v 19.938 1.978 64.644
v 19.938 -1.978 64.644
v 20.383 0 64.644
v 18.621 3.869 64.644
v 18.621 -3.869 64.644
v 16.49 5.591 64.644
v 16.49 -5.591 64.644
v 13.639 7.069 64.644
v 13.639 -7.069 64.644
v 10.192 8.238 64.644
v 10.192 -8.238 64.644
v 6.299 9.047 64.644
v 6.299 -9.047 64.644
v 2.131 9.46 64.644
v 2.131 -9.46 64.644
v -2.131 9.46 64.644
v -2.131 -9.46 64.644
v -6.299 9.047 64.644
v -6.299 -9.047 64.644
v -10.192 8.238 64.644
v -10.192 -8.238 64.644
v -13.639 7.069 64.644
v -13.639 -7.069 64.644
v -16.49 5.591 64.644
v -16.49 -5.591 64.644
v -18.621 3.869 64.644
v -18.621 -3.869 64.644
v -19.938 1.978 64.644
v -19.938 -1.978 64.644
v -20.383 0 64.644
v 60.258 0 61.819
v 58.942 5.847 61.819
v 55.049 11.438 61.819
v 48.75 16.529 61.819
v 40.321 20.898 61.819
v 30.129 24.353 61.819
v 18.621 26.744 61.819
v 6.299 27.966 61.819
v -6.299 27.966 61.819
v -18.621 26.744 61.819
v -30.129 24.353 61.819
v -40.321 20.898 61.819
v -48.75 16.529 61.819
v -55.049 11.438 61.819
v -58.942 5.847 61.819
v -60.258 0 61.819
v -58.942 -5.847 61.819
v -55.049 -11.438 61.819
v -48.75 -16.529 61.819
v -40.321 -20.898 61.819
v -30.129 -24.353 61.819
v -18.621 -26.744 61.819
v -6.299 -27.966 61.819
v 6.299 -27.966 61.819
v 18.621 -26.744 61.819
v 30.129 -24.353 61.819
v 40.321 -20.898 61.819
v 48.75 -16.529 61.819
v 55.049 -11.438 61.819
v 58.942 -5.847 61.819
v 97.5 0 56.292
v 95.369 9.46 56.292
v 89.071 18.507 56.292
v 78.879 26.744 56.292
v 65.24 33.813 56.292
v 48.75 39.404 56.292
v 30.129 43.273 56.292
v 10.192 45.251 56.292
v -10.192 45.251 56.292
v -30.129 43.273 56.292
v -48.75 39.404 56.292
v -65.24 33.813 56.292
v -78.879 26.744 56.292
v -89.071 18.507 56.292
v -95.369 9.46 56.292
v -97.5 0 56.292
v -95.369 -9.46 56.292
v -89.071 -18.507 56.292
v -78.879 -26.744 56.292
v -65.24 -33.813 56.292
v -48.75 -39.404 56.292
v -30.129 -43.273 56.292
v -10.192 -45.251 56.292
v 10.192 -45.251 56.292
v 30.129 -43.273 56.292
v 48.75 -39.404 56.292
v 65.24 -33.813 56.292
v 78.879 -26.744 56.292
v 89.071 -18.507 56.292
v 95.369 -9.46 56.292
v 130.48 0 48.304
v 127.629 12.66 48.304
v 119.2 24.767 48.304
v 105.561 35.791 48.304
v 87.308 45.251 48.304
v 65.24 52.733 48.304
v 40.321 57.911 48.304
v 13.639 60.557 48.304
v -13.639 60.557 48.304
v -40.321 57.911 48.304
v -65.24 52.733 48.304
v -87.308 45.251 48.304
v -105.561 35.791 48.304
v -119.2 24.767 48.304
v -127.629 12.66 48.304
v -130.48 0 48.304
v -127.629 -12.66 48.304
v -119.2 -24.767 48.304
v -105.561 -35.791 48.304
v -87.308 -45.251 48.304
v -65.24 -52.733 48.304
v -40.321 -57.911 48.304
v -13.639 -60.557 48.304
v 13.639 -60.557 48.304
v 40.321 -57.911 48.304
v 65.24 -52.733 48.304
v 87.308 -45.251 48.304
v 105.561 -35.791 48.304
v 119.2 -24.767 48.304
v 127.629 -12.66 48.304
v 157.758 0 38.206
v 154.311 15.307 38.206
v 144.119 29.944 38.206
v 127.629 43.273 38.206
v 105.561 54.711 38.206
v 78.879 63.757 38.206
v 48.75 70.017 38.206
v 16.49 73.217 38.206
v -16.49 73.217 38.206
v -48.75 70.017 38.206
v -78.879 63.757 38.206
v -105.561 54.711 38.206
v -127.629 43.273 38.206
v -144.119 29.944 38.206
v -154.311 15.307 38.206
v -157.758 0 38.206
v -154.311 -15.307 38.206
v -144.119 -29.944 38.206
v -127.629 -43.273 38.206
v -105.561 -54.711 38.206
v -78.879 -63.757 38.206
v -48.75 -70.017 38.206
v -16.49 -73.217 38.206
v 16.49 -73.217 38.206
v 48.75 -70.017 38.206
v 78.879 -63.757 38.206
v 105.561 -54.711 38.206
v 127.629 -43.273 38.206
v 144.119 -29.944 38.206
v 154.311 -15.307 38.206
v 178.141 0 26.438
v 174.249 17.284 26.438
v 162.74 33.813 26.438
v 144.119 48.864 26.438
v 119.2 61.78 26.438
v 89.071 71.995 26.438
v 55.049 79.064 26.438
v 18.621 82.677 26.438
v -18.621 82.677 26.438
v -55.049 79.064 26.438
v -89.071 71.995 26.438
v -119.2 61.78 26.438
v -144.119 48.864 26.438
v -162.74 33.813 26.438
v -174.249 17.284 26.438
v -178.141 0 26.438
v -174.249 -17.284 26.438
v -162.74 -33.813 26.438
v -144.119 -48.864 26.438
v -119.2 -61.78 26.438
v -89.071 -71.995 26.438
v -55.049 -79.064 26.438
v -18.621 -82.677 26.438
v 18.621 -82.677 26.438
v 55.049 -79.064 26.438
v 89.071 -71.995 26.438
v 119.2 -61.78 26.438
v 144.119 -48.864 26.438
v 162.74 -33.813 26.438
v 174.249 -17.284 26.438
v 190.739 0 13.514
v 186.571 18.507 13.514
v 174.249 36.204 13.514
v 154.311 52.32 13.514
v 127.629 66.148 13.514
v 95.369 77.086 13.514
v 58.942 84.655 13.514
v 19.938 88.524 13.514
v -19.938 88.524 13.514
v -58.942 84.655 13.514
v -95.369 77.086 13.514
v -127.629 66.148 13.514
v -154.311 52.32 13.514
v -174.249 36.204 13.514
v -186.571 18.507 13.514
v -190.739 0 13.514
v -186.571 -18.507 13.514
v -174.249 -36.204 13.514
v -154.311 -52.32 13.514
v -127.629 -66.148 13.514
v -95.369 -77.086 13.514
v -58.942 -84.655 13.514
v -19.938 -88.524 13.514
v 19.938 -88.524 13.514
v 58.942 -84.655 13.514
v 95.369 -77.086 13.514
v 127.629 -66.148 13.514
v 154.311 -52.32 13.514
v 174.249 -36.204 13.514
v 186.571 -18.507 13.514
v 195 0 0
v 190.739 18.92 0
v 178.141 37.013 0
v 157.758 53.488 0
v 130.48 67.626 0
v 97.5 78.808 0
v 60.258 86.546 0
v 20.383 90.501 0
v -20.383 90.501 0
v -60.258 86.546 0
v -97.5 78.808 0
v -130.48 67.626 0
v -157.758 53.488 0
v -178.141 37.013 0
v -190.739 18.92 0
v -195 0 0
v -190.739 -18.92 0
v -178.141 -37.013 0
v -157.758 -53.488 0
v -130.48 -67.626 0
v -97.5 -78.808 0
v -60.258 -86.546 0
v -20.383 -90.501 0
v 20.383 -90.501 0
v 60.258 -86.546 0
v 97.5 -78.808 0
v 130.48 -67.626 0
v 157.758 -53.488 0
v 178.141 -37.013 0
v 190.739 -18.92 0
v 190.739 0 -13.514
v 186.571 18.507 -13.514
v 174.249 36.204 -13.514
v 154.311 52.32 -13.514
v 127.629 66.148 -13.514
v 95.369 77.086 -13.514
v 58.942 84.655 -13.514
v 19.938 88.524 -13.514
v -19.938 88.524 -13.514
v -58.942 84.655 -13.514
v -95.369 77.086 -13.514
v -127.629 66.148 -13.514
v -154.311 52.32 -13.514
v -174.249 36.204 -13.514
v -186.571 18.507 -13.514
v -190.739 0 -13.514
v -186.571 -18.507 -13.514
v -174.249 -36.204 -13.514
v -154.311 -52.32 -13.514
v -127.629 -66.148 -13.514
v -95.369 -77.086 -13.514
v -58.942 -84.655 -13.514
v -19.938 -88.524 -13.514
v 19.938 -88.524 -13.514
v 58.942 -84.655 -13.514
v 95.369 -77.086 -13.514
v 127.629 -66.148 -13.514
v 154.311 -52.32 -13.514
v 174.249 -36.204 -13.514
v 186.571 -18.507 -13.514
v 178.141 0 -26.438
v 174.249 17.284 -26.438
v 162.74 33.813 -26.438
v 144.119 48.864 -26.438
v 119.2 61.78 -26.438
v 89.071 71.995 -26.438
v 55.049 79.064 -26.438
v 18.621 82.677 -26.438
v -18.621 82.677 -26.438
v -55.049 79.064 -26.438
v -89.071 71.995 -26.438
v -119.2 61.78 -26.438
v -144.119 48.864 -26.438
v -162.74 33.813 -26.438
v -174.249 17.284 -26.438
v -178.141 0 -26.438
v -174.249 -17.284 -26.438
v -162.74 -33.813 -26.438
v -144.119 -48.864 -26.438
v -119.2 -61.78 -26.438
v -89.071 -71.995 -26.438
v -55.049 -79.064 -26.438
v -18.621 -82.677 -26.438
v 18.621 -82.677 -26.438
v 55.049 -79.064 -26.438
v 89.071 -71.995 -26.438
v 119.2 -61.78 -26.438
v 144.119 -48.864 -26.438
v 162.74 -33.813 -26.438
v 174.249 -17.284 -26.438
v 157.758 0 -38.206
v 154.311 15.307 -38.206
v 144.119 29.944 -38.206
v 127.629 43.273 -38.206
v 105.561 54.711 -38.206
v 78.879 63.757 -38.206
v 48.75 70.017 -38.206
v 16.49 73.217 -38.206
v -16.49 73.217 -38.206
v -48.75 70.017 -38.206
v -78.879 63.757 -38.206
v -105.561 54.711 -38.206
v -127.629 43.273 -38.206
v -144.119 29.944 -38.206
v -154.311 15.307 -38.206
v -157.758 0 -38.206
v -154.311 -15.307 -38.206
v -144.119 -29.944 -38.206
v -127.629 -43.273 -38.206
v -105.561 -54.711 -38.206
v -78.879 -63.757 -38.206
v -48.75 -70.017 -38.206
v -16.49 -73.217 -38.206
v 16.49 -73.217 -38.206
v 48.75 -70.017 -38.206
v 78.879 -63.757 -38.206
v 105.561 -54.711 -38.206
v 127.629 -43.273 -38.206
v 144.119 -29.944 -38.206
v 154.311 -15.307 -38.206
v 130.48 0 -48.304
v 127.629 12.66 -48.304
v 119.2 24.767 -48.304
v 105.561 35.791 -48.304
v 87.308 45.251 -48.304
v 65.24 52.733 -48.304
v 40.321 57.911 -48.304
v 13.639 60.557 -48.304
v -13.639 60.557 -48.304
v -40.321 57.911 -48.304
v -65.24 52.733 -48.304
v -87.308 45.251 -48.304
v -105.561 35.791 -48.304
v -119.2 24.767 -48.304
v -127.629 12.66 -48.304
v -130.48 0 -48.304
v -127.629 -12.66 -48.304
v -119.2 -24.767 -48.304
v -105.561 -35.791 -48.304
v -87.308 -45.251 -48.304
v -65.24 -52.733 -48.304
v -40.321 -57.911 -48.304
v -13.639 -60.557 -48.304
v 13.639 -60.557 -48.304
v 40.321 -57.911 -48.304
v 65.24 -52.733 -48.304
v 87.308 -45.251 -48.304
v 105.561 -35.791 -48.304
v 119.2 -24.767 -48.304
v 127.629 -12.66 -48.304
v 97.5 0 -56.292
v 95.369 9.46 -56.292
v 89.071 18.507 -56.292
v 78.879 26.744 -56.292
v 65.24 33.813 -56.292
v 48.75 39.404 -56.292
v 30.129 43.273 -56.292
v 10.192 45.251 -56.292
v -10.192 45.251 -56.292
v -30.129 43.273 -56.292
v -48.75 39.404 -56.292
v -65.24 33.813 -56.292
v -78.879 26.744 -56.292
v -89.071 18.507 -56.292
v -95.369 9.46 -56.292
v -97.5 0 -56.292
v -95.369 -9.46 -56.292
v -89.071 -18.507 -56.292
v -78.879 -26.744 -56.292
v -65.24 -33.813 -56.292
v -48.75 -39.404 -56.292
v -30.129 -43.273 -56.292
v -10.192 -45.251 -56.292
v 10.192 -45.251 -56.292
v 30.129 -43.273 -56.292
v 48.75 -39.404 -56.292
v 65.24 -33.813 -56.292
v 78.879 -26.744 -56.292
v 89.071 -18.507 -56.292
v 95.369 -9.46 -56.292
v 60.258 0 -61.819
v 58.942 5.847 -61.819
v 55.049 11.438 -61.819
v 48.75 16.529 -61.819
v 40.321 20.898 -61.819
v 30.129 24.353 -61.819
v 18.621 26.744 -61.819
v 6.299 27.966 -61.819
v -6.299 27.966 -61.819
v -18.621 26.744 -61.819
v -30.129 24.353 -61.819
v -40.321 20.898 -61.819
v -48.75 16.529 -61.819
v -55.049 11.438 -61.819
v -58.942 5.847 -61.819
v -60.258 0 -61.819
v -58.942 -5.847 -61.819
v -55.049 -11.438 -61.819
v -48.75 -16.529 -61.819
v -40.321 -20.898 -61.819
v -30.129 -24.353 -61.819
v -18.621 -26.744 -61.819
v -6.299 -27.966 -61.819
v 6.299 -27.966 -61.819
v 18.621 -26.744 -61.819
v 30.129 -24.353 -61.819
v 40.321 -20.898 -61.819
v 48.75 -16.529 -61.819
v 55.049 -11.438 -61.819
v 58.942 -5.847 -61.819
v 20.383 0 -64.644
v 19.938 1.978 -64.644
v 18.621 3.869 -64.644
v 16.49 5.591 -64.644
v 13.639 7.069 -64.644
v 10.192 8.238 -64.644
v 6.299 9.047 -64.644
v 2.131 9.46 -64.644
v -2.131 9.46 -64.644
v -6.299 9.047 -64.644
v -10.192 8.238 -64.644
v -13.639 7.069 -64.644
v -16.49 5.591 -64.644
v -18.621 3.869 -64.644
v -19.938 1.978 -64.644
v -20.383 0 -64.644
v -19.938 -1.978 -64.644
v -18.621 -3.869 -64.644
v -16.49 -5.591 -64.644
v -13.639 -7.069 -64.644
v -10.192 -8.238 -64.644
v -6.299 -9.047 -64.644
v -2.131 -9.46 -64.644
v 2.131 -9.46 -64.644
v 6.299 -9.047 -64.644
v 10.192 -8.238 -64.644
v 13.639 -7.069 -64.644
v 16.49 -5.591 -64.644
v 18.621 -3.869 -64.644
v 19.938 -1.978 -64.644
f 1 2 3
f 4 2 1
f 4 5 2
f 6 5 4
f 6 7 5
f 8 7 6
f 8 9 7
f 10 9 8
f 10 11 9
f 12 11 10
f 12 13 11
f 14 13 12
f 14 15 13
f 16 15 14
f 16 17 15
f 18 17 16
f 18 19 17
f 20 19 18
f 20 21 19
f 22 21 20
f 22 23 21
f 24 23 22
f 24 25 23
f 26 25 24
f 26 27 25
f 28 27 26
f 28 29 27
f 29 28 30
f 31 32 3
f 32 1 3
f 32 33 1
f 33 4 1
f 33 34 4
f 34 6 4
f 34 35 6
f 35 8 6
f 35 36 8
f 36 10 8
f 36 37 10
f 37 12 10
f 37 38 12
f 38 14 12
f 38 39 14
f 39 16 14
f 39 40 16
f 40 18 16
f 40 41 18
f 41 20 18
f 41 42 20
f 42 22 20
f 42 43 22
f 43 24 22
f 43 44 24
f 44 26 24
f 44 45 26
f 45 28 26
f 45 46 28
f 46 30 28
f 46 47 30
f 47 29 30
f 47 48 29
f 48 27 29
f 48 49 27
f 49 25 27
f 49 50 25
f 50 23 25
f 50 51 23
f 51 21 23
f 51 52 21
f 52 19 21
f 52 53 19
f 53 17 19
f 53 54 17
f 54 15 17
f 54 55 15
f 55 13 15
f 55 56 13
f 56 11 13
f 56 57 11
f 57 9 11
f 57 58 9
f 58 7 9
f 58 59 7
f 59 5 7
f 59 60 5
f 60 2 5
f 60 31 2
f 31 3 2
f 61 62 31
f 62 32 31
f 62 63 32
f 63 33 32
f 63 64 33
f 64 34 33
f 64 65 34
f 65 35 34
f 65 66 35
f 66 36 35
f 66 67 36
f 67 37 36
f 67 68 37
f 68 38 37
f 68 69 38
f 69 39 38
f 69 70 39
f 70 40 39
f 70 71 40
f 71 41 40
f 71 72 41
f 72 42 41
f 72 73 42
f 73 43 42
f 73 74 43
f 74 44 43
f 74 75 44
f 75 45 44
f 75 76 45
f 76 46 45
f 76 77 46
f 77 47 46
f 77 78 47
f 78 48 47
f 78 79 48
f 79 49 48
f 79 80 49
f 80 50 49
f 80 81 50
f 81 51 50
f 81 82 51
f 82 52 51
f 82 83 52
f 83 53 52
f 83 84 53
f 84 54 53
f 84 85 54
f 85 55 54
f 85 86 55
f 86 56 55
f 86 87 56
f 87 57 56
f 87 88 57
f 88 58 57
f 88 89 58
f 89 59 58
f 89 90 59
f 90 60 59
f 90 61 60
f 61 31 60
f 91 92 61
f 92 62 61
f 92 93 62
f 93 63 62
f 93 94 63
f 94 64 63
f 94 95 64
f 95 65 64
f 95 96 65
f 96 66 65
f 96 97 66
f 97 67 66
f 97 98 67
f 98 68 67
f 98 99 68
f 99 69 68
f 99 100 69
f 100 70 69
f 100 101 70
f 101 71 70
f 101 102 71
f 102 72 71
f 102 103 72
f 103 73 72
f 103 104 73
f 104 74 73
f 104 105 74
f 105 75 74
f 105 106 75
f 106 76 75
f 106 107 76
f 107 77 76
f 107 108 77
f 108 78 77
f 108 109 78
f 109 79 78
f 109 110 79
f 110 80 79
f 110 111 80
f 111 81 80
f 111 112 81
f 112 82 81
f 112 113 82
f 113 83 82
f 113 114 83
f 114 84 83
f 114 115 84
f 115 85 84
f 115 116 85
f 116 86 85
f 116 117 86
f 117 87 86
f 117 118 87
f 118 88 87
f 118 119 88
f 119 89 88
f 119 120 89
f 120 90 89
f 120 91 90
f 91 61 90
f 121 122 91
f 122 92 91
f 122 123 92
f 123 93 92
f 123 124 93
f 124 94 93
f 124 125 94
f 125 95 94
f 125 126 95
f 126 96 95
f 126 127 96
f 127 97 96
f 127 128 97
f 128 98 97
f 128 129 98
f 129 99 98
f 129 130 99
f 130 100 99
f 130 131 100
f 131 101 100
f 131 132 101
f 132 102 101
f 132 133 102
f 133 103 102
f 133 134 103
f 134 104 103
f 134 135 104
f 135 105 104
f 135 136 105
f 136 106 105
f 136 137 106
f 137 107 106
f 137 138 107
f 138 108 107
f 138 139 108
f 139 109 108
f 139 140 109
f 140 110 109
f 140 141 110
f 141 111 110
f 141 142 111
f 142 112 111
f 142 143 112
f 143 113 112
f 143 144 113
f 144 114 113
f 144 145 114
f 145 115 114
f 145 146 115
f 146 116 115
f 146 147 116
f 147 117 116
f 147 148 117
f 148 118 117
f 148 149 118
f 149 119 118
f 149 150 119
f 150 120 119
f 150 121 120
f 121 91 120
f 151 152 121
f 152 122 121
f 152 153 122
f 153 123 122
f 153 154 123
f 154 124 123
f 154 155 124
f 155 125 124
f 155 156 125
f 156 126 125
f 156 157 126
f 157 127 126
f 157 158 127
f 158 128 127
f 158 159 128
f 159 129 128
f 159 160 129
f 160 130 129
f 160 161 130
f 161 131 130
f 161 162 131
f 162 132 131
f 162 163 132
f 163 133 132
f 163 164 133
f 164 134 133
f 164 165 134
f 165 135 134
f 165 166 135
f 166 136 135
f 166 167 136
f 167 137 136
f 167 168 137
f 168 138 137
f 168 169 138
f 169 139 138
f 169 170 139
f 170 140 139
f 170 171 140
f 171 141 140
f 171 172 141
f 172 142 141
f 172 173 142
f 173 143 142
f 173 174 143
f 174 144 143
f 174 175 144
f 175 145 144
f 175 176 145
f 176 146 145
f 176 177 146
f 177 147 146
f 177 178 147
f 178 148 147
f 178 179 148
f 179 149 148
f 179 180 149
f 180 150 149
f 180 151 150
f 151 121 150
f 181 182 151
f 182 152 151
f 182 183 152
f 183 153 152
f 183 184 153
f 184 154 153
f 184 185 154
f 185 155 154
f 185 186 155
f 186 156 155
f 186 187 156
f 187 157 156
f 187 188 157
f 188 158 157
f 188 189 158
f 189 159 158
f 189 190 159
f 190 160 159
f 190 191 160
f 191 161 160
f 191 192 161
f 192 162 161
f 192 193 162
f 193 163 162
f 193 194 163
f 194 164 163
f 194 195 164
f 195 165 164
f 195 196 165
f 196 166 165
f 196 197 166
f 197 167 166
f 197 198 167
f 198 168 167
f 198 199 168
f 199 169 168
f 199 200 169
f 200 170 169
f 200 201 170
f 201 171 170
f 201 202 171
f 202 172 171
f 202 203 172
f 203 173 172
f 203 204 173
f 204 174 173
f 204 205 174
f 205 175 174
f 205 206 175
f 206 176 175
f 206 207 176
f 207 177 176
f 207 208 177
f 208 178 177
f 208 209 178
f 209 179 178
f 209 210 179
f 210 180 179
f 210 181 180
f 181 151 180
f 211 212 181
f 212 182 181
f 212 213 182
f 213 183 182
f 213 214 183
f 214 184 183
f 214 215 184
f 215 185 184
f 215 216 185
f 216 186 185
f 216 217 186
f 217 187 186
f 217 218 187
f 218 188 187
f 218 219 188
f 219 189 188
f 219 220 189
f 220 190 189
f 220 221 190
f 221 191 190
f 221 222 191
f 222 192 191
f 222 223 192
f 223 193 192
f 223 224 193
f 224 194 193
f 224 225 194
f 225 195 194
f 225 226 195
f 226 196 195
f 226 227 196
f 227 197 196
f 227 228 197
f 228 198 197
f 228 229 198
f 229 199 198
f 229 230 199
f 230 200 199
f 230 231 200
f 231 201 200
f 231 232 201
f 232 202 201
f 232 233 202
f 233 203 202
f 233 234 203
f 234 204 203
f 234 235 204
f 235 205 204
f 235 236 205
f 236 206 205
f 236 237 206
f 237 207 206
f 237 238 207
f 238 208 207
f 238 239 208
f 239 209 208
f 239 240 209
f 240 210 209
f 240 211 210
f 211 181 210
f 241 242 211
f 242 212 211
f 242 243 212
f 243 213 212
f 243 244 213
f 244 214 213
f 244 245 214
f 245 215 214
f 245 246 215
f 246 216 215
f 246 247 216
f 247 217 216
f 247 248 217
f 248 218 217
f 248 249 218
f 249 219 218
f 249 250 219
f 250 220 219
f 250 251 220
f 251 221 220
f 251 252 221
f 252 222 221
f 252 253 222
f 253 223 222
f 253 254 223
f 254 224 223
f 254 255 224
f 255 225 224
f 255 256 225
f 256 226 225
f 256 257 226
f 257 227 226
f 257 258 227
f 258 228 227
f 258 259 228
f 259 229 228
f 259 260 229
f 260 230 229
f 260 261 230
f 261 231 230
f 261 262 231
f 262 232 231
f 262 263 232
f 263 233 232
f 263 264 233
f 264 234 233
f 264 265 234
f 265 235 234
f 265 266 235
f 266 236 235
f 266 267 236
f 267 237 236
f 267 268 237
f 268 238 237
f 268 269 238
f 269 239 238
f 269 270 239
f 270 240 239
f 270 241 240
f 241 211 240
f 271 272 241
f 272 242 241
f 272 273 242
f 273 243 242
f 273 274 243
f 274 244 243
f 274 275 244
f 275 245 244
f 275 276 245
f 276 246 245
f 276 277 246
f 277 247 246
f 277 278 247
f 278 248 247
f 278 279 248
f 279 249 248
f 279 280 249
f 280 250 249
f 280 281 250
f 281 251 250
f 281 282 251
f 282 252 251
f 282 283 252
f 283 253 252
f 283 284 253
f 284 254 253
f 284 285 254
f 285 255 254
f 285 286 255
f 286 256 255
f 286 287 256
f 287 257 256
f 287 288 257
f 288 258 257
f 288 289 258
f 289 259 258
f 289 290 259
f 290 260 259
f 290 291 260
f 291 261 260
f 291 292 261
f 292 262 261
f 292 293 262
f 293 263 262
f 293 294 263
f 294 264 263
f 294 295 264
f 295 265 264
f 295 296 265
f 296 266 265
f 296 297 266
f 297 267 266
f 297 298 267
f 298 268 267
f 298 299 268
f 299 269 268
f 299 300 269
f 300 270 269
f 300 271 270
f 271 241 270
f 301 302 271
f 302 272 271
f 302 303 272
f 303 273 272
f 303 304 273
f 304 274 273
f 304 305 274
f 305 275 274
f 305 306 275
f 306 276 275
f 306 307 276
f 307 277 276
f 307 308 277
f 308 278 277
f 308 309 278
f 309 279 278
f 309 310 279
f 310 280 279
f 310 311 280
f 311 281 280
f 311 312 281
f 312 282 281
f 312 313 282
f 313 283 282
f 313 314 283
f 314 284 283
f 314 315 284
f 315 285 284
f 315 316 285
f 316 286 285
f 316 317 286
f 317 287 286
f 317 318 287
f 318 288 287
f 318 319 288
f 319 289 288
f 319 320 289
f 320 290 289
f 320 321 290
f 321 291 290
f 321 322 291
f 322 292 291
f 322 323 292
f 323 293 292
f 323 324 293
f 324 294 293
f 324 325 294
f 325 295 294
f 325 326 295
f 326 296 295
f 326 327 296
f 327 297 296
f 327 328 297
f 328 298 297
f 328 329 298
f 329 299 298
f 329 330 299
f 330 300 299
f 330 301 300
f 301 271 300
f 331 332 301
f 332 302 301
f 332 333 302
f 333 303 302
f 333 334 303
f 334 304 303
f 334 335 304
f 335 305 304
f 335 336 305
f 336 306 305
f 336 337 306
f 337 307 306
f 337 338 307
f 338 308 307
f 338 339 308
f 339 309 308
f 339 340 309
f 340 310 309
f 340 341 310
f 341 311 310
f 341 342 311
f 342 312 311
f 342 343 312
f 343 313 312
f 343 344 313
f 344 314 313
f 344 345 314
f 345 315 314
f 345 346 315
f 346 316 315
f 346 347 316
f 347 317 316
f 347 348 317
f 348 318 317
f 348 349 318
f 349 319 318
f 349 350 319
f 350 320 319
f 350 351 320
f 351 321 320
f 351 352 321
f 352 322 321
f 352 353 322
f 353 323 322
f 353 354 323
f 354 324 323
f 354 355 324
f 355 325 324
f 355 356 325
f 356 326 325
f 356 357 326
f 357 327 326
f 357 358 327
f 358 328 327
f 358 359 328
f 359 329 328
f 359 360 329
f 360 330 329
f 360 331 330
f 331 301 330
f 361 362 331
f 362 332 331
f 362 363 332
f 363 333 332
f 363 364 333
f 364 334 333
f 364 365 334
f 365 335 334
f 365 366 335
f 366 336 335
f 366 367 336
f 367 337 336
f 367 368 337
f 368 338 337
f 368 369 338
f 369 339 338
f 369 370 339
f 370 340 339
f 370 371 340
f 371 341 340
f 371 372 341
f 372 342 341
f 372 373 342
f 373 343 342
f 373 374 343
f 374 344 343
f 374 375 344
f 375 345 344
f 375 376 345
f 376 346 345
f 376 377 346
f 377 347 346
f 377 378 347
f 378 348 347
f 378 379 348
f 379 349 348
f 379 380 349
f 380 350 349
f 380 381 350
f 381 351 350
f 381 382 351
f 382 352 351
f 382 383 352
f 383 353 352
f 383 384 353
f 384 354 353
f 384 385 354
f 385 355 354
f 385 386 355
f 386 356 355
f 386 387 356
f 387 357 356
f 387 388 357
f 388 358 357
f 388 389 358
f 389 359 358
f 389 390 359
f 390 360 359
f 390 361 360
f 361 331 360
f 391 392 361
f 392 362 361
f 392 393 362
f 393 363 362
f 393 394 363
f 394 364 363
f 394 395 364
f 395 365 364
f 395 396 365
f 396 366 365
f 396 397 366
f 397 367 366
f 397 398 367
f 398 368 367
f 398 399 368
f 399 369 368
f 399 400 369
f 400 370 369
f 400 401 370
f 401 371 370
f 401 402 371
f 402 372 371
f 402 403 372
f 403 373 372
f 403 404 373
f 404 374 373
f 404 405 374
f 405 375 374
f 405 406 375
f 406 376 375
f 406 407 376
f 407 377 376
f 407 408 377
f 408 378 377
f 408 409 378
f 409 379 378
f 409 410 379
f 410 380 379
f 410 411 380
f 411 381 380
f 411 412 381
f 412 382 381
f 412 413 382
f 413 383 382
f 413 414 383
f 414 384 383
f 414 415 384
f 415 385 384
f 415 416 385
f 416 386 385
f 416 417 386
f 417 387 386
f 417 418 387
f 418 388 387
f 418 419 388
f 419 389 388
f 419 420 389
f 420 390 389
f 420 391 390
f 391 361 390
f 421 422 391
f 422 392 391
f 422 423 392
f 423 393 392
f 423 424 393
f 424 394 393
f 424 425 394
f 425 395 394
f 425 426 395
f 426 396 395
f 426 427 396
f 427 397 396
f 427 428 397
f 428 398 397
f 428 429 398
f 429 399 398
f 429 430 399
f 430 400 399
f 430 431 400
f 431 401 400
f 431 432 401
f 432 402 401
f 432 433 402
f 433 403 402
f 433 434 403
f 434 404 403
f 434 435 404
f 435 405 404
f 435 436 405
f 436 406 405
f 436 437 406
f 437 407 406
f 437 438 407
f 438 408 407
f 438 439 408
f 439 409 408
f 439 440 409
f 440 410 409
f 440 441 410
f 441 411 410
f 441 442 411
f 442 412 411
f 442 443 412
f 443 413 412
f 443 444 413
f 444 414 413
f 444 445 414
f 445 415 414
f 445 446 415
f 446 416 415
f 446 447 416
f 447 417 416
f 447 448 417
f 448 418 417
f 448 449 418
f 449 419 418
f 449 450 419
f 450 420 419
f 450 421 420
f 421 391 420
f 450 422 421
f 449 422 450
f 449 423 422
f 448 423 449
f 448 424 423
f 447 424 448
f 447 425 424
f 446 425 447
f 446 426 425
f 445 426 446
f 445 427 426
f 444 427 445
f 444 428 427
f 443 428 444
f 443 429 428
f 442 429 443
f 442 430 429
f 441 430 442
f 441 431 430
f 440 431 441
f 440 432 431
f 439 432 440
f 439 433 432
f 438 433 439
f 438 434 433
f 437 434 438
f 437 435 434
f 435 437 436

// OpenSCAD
// Generated by SolidPython 1.0.1 on 2020-07-29 00:46:51


scale(v = [15, 7, 5]) {
	sphere(r = 13);
}
/***********************************************
*********      SolidPython code:      **********
************************************************
 
# import packages: SolidPython
from solid import *
from solid.utils import *
from itertools import chain, combinations, permutations


class Resize:

    def __init__(self, scad_file):
        self.scad_file = scad_file
        #self.scad_file = import_scad(scad_file)
        # cone/cylinder param:
        self.r1 = 0
        self.r2 = 0
        self.h = 0
        # rectangular prism param:
        self.w = 0
        self.l = 0
        # ellipse param:
        self.r = 0

    # import OpenScad code (file name corresponds to shape)


    # classify shape + parameters
    def assign(self, param1, param2, param3):
        if self.scad_file == 'cone.scad':
            self.r1 = param1
            self.r2 = param2
            self.h = param3
        elif self.scad_file == 'cylinder.scad':
            self.r1 = param1
            self.r2 = param2
            self.h = param3
        elif self.scad_file == 'rectangularPrism.scad':
            self.h = param1
            self.l = param2
            self.w = param3
        else:
            self.r = param1
            self.h = param2

    # resize parameters
    def iterate(self):
        x = range(3, 20, 2)
        i = 1
        if self.scad_file == 'cone.scad':
            tempList = list(permutations(x, 2))
            for temp in tempList:
                param1 = temp[0]
                param2 = temp[1]
                filepath = 'produced_scad_files/' + 'cone' + str(param1) + '_' + str(param2) + '_' + '.scad'
                scad_render_to_file(cylinder(h=param1, r1=param2, r2=0), filepath)

        elif self.scad_file == 'cylinder.scad':
            tempList = list(permutations(x, 3))
            for temp in tempList:
                param1 = temp[0]
                param2 = temp[1]
                filepath = 'produced_scad_files/' + 'cylinder' + str(param1) + '_' + str(param2) + '_' + '.scad'
                scad_render_to_file(cylinder(h=param1, r1=param2, r2=param2), filepath)

        elif self.scad_file == 'rectangularPrism.scad':
            tempList = list(permutations(x, 3))
            for temp in tempList:
                param1 = temp[0]
                param2 = temp[1]
                param3 = temp[2]
                filepath = 'produced_scad_files/' + 'rectangularPrism' + str(param1) + '_' + str(param2) + '_' + str(
                    param3) + '.scad'
                scad_render_to_file(cube(size=(param1, param2, param3)), filepath)

        elif self.scad_file == 'ellipse.scad':
            tempList = list(permutations(x, 4))
            for temp in tempList:
                param1 = temp[0]
                param2 = temp[1]
                param3 = temp[2]
                param4 = temp[3]
                filepath = 'produced_scad_files/' + 'ellipse' + str(param1) + '_' + str(param2) + '_' + str(param3) + '_' + str(param4) + '.scad'
                scad_render_to_file(scale([param1, param2, param3])(sphere(r=param4)), filepath)

    def render_to_scadfile(self):
        scad_render_to_file(scad, 'example.scad') 
 
************************************************/
